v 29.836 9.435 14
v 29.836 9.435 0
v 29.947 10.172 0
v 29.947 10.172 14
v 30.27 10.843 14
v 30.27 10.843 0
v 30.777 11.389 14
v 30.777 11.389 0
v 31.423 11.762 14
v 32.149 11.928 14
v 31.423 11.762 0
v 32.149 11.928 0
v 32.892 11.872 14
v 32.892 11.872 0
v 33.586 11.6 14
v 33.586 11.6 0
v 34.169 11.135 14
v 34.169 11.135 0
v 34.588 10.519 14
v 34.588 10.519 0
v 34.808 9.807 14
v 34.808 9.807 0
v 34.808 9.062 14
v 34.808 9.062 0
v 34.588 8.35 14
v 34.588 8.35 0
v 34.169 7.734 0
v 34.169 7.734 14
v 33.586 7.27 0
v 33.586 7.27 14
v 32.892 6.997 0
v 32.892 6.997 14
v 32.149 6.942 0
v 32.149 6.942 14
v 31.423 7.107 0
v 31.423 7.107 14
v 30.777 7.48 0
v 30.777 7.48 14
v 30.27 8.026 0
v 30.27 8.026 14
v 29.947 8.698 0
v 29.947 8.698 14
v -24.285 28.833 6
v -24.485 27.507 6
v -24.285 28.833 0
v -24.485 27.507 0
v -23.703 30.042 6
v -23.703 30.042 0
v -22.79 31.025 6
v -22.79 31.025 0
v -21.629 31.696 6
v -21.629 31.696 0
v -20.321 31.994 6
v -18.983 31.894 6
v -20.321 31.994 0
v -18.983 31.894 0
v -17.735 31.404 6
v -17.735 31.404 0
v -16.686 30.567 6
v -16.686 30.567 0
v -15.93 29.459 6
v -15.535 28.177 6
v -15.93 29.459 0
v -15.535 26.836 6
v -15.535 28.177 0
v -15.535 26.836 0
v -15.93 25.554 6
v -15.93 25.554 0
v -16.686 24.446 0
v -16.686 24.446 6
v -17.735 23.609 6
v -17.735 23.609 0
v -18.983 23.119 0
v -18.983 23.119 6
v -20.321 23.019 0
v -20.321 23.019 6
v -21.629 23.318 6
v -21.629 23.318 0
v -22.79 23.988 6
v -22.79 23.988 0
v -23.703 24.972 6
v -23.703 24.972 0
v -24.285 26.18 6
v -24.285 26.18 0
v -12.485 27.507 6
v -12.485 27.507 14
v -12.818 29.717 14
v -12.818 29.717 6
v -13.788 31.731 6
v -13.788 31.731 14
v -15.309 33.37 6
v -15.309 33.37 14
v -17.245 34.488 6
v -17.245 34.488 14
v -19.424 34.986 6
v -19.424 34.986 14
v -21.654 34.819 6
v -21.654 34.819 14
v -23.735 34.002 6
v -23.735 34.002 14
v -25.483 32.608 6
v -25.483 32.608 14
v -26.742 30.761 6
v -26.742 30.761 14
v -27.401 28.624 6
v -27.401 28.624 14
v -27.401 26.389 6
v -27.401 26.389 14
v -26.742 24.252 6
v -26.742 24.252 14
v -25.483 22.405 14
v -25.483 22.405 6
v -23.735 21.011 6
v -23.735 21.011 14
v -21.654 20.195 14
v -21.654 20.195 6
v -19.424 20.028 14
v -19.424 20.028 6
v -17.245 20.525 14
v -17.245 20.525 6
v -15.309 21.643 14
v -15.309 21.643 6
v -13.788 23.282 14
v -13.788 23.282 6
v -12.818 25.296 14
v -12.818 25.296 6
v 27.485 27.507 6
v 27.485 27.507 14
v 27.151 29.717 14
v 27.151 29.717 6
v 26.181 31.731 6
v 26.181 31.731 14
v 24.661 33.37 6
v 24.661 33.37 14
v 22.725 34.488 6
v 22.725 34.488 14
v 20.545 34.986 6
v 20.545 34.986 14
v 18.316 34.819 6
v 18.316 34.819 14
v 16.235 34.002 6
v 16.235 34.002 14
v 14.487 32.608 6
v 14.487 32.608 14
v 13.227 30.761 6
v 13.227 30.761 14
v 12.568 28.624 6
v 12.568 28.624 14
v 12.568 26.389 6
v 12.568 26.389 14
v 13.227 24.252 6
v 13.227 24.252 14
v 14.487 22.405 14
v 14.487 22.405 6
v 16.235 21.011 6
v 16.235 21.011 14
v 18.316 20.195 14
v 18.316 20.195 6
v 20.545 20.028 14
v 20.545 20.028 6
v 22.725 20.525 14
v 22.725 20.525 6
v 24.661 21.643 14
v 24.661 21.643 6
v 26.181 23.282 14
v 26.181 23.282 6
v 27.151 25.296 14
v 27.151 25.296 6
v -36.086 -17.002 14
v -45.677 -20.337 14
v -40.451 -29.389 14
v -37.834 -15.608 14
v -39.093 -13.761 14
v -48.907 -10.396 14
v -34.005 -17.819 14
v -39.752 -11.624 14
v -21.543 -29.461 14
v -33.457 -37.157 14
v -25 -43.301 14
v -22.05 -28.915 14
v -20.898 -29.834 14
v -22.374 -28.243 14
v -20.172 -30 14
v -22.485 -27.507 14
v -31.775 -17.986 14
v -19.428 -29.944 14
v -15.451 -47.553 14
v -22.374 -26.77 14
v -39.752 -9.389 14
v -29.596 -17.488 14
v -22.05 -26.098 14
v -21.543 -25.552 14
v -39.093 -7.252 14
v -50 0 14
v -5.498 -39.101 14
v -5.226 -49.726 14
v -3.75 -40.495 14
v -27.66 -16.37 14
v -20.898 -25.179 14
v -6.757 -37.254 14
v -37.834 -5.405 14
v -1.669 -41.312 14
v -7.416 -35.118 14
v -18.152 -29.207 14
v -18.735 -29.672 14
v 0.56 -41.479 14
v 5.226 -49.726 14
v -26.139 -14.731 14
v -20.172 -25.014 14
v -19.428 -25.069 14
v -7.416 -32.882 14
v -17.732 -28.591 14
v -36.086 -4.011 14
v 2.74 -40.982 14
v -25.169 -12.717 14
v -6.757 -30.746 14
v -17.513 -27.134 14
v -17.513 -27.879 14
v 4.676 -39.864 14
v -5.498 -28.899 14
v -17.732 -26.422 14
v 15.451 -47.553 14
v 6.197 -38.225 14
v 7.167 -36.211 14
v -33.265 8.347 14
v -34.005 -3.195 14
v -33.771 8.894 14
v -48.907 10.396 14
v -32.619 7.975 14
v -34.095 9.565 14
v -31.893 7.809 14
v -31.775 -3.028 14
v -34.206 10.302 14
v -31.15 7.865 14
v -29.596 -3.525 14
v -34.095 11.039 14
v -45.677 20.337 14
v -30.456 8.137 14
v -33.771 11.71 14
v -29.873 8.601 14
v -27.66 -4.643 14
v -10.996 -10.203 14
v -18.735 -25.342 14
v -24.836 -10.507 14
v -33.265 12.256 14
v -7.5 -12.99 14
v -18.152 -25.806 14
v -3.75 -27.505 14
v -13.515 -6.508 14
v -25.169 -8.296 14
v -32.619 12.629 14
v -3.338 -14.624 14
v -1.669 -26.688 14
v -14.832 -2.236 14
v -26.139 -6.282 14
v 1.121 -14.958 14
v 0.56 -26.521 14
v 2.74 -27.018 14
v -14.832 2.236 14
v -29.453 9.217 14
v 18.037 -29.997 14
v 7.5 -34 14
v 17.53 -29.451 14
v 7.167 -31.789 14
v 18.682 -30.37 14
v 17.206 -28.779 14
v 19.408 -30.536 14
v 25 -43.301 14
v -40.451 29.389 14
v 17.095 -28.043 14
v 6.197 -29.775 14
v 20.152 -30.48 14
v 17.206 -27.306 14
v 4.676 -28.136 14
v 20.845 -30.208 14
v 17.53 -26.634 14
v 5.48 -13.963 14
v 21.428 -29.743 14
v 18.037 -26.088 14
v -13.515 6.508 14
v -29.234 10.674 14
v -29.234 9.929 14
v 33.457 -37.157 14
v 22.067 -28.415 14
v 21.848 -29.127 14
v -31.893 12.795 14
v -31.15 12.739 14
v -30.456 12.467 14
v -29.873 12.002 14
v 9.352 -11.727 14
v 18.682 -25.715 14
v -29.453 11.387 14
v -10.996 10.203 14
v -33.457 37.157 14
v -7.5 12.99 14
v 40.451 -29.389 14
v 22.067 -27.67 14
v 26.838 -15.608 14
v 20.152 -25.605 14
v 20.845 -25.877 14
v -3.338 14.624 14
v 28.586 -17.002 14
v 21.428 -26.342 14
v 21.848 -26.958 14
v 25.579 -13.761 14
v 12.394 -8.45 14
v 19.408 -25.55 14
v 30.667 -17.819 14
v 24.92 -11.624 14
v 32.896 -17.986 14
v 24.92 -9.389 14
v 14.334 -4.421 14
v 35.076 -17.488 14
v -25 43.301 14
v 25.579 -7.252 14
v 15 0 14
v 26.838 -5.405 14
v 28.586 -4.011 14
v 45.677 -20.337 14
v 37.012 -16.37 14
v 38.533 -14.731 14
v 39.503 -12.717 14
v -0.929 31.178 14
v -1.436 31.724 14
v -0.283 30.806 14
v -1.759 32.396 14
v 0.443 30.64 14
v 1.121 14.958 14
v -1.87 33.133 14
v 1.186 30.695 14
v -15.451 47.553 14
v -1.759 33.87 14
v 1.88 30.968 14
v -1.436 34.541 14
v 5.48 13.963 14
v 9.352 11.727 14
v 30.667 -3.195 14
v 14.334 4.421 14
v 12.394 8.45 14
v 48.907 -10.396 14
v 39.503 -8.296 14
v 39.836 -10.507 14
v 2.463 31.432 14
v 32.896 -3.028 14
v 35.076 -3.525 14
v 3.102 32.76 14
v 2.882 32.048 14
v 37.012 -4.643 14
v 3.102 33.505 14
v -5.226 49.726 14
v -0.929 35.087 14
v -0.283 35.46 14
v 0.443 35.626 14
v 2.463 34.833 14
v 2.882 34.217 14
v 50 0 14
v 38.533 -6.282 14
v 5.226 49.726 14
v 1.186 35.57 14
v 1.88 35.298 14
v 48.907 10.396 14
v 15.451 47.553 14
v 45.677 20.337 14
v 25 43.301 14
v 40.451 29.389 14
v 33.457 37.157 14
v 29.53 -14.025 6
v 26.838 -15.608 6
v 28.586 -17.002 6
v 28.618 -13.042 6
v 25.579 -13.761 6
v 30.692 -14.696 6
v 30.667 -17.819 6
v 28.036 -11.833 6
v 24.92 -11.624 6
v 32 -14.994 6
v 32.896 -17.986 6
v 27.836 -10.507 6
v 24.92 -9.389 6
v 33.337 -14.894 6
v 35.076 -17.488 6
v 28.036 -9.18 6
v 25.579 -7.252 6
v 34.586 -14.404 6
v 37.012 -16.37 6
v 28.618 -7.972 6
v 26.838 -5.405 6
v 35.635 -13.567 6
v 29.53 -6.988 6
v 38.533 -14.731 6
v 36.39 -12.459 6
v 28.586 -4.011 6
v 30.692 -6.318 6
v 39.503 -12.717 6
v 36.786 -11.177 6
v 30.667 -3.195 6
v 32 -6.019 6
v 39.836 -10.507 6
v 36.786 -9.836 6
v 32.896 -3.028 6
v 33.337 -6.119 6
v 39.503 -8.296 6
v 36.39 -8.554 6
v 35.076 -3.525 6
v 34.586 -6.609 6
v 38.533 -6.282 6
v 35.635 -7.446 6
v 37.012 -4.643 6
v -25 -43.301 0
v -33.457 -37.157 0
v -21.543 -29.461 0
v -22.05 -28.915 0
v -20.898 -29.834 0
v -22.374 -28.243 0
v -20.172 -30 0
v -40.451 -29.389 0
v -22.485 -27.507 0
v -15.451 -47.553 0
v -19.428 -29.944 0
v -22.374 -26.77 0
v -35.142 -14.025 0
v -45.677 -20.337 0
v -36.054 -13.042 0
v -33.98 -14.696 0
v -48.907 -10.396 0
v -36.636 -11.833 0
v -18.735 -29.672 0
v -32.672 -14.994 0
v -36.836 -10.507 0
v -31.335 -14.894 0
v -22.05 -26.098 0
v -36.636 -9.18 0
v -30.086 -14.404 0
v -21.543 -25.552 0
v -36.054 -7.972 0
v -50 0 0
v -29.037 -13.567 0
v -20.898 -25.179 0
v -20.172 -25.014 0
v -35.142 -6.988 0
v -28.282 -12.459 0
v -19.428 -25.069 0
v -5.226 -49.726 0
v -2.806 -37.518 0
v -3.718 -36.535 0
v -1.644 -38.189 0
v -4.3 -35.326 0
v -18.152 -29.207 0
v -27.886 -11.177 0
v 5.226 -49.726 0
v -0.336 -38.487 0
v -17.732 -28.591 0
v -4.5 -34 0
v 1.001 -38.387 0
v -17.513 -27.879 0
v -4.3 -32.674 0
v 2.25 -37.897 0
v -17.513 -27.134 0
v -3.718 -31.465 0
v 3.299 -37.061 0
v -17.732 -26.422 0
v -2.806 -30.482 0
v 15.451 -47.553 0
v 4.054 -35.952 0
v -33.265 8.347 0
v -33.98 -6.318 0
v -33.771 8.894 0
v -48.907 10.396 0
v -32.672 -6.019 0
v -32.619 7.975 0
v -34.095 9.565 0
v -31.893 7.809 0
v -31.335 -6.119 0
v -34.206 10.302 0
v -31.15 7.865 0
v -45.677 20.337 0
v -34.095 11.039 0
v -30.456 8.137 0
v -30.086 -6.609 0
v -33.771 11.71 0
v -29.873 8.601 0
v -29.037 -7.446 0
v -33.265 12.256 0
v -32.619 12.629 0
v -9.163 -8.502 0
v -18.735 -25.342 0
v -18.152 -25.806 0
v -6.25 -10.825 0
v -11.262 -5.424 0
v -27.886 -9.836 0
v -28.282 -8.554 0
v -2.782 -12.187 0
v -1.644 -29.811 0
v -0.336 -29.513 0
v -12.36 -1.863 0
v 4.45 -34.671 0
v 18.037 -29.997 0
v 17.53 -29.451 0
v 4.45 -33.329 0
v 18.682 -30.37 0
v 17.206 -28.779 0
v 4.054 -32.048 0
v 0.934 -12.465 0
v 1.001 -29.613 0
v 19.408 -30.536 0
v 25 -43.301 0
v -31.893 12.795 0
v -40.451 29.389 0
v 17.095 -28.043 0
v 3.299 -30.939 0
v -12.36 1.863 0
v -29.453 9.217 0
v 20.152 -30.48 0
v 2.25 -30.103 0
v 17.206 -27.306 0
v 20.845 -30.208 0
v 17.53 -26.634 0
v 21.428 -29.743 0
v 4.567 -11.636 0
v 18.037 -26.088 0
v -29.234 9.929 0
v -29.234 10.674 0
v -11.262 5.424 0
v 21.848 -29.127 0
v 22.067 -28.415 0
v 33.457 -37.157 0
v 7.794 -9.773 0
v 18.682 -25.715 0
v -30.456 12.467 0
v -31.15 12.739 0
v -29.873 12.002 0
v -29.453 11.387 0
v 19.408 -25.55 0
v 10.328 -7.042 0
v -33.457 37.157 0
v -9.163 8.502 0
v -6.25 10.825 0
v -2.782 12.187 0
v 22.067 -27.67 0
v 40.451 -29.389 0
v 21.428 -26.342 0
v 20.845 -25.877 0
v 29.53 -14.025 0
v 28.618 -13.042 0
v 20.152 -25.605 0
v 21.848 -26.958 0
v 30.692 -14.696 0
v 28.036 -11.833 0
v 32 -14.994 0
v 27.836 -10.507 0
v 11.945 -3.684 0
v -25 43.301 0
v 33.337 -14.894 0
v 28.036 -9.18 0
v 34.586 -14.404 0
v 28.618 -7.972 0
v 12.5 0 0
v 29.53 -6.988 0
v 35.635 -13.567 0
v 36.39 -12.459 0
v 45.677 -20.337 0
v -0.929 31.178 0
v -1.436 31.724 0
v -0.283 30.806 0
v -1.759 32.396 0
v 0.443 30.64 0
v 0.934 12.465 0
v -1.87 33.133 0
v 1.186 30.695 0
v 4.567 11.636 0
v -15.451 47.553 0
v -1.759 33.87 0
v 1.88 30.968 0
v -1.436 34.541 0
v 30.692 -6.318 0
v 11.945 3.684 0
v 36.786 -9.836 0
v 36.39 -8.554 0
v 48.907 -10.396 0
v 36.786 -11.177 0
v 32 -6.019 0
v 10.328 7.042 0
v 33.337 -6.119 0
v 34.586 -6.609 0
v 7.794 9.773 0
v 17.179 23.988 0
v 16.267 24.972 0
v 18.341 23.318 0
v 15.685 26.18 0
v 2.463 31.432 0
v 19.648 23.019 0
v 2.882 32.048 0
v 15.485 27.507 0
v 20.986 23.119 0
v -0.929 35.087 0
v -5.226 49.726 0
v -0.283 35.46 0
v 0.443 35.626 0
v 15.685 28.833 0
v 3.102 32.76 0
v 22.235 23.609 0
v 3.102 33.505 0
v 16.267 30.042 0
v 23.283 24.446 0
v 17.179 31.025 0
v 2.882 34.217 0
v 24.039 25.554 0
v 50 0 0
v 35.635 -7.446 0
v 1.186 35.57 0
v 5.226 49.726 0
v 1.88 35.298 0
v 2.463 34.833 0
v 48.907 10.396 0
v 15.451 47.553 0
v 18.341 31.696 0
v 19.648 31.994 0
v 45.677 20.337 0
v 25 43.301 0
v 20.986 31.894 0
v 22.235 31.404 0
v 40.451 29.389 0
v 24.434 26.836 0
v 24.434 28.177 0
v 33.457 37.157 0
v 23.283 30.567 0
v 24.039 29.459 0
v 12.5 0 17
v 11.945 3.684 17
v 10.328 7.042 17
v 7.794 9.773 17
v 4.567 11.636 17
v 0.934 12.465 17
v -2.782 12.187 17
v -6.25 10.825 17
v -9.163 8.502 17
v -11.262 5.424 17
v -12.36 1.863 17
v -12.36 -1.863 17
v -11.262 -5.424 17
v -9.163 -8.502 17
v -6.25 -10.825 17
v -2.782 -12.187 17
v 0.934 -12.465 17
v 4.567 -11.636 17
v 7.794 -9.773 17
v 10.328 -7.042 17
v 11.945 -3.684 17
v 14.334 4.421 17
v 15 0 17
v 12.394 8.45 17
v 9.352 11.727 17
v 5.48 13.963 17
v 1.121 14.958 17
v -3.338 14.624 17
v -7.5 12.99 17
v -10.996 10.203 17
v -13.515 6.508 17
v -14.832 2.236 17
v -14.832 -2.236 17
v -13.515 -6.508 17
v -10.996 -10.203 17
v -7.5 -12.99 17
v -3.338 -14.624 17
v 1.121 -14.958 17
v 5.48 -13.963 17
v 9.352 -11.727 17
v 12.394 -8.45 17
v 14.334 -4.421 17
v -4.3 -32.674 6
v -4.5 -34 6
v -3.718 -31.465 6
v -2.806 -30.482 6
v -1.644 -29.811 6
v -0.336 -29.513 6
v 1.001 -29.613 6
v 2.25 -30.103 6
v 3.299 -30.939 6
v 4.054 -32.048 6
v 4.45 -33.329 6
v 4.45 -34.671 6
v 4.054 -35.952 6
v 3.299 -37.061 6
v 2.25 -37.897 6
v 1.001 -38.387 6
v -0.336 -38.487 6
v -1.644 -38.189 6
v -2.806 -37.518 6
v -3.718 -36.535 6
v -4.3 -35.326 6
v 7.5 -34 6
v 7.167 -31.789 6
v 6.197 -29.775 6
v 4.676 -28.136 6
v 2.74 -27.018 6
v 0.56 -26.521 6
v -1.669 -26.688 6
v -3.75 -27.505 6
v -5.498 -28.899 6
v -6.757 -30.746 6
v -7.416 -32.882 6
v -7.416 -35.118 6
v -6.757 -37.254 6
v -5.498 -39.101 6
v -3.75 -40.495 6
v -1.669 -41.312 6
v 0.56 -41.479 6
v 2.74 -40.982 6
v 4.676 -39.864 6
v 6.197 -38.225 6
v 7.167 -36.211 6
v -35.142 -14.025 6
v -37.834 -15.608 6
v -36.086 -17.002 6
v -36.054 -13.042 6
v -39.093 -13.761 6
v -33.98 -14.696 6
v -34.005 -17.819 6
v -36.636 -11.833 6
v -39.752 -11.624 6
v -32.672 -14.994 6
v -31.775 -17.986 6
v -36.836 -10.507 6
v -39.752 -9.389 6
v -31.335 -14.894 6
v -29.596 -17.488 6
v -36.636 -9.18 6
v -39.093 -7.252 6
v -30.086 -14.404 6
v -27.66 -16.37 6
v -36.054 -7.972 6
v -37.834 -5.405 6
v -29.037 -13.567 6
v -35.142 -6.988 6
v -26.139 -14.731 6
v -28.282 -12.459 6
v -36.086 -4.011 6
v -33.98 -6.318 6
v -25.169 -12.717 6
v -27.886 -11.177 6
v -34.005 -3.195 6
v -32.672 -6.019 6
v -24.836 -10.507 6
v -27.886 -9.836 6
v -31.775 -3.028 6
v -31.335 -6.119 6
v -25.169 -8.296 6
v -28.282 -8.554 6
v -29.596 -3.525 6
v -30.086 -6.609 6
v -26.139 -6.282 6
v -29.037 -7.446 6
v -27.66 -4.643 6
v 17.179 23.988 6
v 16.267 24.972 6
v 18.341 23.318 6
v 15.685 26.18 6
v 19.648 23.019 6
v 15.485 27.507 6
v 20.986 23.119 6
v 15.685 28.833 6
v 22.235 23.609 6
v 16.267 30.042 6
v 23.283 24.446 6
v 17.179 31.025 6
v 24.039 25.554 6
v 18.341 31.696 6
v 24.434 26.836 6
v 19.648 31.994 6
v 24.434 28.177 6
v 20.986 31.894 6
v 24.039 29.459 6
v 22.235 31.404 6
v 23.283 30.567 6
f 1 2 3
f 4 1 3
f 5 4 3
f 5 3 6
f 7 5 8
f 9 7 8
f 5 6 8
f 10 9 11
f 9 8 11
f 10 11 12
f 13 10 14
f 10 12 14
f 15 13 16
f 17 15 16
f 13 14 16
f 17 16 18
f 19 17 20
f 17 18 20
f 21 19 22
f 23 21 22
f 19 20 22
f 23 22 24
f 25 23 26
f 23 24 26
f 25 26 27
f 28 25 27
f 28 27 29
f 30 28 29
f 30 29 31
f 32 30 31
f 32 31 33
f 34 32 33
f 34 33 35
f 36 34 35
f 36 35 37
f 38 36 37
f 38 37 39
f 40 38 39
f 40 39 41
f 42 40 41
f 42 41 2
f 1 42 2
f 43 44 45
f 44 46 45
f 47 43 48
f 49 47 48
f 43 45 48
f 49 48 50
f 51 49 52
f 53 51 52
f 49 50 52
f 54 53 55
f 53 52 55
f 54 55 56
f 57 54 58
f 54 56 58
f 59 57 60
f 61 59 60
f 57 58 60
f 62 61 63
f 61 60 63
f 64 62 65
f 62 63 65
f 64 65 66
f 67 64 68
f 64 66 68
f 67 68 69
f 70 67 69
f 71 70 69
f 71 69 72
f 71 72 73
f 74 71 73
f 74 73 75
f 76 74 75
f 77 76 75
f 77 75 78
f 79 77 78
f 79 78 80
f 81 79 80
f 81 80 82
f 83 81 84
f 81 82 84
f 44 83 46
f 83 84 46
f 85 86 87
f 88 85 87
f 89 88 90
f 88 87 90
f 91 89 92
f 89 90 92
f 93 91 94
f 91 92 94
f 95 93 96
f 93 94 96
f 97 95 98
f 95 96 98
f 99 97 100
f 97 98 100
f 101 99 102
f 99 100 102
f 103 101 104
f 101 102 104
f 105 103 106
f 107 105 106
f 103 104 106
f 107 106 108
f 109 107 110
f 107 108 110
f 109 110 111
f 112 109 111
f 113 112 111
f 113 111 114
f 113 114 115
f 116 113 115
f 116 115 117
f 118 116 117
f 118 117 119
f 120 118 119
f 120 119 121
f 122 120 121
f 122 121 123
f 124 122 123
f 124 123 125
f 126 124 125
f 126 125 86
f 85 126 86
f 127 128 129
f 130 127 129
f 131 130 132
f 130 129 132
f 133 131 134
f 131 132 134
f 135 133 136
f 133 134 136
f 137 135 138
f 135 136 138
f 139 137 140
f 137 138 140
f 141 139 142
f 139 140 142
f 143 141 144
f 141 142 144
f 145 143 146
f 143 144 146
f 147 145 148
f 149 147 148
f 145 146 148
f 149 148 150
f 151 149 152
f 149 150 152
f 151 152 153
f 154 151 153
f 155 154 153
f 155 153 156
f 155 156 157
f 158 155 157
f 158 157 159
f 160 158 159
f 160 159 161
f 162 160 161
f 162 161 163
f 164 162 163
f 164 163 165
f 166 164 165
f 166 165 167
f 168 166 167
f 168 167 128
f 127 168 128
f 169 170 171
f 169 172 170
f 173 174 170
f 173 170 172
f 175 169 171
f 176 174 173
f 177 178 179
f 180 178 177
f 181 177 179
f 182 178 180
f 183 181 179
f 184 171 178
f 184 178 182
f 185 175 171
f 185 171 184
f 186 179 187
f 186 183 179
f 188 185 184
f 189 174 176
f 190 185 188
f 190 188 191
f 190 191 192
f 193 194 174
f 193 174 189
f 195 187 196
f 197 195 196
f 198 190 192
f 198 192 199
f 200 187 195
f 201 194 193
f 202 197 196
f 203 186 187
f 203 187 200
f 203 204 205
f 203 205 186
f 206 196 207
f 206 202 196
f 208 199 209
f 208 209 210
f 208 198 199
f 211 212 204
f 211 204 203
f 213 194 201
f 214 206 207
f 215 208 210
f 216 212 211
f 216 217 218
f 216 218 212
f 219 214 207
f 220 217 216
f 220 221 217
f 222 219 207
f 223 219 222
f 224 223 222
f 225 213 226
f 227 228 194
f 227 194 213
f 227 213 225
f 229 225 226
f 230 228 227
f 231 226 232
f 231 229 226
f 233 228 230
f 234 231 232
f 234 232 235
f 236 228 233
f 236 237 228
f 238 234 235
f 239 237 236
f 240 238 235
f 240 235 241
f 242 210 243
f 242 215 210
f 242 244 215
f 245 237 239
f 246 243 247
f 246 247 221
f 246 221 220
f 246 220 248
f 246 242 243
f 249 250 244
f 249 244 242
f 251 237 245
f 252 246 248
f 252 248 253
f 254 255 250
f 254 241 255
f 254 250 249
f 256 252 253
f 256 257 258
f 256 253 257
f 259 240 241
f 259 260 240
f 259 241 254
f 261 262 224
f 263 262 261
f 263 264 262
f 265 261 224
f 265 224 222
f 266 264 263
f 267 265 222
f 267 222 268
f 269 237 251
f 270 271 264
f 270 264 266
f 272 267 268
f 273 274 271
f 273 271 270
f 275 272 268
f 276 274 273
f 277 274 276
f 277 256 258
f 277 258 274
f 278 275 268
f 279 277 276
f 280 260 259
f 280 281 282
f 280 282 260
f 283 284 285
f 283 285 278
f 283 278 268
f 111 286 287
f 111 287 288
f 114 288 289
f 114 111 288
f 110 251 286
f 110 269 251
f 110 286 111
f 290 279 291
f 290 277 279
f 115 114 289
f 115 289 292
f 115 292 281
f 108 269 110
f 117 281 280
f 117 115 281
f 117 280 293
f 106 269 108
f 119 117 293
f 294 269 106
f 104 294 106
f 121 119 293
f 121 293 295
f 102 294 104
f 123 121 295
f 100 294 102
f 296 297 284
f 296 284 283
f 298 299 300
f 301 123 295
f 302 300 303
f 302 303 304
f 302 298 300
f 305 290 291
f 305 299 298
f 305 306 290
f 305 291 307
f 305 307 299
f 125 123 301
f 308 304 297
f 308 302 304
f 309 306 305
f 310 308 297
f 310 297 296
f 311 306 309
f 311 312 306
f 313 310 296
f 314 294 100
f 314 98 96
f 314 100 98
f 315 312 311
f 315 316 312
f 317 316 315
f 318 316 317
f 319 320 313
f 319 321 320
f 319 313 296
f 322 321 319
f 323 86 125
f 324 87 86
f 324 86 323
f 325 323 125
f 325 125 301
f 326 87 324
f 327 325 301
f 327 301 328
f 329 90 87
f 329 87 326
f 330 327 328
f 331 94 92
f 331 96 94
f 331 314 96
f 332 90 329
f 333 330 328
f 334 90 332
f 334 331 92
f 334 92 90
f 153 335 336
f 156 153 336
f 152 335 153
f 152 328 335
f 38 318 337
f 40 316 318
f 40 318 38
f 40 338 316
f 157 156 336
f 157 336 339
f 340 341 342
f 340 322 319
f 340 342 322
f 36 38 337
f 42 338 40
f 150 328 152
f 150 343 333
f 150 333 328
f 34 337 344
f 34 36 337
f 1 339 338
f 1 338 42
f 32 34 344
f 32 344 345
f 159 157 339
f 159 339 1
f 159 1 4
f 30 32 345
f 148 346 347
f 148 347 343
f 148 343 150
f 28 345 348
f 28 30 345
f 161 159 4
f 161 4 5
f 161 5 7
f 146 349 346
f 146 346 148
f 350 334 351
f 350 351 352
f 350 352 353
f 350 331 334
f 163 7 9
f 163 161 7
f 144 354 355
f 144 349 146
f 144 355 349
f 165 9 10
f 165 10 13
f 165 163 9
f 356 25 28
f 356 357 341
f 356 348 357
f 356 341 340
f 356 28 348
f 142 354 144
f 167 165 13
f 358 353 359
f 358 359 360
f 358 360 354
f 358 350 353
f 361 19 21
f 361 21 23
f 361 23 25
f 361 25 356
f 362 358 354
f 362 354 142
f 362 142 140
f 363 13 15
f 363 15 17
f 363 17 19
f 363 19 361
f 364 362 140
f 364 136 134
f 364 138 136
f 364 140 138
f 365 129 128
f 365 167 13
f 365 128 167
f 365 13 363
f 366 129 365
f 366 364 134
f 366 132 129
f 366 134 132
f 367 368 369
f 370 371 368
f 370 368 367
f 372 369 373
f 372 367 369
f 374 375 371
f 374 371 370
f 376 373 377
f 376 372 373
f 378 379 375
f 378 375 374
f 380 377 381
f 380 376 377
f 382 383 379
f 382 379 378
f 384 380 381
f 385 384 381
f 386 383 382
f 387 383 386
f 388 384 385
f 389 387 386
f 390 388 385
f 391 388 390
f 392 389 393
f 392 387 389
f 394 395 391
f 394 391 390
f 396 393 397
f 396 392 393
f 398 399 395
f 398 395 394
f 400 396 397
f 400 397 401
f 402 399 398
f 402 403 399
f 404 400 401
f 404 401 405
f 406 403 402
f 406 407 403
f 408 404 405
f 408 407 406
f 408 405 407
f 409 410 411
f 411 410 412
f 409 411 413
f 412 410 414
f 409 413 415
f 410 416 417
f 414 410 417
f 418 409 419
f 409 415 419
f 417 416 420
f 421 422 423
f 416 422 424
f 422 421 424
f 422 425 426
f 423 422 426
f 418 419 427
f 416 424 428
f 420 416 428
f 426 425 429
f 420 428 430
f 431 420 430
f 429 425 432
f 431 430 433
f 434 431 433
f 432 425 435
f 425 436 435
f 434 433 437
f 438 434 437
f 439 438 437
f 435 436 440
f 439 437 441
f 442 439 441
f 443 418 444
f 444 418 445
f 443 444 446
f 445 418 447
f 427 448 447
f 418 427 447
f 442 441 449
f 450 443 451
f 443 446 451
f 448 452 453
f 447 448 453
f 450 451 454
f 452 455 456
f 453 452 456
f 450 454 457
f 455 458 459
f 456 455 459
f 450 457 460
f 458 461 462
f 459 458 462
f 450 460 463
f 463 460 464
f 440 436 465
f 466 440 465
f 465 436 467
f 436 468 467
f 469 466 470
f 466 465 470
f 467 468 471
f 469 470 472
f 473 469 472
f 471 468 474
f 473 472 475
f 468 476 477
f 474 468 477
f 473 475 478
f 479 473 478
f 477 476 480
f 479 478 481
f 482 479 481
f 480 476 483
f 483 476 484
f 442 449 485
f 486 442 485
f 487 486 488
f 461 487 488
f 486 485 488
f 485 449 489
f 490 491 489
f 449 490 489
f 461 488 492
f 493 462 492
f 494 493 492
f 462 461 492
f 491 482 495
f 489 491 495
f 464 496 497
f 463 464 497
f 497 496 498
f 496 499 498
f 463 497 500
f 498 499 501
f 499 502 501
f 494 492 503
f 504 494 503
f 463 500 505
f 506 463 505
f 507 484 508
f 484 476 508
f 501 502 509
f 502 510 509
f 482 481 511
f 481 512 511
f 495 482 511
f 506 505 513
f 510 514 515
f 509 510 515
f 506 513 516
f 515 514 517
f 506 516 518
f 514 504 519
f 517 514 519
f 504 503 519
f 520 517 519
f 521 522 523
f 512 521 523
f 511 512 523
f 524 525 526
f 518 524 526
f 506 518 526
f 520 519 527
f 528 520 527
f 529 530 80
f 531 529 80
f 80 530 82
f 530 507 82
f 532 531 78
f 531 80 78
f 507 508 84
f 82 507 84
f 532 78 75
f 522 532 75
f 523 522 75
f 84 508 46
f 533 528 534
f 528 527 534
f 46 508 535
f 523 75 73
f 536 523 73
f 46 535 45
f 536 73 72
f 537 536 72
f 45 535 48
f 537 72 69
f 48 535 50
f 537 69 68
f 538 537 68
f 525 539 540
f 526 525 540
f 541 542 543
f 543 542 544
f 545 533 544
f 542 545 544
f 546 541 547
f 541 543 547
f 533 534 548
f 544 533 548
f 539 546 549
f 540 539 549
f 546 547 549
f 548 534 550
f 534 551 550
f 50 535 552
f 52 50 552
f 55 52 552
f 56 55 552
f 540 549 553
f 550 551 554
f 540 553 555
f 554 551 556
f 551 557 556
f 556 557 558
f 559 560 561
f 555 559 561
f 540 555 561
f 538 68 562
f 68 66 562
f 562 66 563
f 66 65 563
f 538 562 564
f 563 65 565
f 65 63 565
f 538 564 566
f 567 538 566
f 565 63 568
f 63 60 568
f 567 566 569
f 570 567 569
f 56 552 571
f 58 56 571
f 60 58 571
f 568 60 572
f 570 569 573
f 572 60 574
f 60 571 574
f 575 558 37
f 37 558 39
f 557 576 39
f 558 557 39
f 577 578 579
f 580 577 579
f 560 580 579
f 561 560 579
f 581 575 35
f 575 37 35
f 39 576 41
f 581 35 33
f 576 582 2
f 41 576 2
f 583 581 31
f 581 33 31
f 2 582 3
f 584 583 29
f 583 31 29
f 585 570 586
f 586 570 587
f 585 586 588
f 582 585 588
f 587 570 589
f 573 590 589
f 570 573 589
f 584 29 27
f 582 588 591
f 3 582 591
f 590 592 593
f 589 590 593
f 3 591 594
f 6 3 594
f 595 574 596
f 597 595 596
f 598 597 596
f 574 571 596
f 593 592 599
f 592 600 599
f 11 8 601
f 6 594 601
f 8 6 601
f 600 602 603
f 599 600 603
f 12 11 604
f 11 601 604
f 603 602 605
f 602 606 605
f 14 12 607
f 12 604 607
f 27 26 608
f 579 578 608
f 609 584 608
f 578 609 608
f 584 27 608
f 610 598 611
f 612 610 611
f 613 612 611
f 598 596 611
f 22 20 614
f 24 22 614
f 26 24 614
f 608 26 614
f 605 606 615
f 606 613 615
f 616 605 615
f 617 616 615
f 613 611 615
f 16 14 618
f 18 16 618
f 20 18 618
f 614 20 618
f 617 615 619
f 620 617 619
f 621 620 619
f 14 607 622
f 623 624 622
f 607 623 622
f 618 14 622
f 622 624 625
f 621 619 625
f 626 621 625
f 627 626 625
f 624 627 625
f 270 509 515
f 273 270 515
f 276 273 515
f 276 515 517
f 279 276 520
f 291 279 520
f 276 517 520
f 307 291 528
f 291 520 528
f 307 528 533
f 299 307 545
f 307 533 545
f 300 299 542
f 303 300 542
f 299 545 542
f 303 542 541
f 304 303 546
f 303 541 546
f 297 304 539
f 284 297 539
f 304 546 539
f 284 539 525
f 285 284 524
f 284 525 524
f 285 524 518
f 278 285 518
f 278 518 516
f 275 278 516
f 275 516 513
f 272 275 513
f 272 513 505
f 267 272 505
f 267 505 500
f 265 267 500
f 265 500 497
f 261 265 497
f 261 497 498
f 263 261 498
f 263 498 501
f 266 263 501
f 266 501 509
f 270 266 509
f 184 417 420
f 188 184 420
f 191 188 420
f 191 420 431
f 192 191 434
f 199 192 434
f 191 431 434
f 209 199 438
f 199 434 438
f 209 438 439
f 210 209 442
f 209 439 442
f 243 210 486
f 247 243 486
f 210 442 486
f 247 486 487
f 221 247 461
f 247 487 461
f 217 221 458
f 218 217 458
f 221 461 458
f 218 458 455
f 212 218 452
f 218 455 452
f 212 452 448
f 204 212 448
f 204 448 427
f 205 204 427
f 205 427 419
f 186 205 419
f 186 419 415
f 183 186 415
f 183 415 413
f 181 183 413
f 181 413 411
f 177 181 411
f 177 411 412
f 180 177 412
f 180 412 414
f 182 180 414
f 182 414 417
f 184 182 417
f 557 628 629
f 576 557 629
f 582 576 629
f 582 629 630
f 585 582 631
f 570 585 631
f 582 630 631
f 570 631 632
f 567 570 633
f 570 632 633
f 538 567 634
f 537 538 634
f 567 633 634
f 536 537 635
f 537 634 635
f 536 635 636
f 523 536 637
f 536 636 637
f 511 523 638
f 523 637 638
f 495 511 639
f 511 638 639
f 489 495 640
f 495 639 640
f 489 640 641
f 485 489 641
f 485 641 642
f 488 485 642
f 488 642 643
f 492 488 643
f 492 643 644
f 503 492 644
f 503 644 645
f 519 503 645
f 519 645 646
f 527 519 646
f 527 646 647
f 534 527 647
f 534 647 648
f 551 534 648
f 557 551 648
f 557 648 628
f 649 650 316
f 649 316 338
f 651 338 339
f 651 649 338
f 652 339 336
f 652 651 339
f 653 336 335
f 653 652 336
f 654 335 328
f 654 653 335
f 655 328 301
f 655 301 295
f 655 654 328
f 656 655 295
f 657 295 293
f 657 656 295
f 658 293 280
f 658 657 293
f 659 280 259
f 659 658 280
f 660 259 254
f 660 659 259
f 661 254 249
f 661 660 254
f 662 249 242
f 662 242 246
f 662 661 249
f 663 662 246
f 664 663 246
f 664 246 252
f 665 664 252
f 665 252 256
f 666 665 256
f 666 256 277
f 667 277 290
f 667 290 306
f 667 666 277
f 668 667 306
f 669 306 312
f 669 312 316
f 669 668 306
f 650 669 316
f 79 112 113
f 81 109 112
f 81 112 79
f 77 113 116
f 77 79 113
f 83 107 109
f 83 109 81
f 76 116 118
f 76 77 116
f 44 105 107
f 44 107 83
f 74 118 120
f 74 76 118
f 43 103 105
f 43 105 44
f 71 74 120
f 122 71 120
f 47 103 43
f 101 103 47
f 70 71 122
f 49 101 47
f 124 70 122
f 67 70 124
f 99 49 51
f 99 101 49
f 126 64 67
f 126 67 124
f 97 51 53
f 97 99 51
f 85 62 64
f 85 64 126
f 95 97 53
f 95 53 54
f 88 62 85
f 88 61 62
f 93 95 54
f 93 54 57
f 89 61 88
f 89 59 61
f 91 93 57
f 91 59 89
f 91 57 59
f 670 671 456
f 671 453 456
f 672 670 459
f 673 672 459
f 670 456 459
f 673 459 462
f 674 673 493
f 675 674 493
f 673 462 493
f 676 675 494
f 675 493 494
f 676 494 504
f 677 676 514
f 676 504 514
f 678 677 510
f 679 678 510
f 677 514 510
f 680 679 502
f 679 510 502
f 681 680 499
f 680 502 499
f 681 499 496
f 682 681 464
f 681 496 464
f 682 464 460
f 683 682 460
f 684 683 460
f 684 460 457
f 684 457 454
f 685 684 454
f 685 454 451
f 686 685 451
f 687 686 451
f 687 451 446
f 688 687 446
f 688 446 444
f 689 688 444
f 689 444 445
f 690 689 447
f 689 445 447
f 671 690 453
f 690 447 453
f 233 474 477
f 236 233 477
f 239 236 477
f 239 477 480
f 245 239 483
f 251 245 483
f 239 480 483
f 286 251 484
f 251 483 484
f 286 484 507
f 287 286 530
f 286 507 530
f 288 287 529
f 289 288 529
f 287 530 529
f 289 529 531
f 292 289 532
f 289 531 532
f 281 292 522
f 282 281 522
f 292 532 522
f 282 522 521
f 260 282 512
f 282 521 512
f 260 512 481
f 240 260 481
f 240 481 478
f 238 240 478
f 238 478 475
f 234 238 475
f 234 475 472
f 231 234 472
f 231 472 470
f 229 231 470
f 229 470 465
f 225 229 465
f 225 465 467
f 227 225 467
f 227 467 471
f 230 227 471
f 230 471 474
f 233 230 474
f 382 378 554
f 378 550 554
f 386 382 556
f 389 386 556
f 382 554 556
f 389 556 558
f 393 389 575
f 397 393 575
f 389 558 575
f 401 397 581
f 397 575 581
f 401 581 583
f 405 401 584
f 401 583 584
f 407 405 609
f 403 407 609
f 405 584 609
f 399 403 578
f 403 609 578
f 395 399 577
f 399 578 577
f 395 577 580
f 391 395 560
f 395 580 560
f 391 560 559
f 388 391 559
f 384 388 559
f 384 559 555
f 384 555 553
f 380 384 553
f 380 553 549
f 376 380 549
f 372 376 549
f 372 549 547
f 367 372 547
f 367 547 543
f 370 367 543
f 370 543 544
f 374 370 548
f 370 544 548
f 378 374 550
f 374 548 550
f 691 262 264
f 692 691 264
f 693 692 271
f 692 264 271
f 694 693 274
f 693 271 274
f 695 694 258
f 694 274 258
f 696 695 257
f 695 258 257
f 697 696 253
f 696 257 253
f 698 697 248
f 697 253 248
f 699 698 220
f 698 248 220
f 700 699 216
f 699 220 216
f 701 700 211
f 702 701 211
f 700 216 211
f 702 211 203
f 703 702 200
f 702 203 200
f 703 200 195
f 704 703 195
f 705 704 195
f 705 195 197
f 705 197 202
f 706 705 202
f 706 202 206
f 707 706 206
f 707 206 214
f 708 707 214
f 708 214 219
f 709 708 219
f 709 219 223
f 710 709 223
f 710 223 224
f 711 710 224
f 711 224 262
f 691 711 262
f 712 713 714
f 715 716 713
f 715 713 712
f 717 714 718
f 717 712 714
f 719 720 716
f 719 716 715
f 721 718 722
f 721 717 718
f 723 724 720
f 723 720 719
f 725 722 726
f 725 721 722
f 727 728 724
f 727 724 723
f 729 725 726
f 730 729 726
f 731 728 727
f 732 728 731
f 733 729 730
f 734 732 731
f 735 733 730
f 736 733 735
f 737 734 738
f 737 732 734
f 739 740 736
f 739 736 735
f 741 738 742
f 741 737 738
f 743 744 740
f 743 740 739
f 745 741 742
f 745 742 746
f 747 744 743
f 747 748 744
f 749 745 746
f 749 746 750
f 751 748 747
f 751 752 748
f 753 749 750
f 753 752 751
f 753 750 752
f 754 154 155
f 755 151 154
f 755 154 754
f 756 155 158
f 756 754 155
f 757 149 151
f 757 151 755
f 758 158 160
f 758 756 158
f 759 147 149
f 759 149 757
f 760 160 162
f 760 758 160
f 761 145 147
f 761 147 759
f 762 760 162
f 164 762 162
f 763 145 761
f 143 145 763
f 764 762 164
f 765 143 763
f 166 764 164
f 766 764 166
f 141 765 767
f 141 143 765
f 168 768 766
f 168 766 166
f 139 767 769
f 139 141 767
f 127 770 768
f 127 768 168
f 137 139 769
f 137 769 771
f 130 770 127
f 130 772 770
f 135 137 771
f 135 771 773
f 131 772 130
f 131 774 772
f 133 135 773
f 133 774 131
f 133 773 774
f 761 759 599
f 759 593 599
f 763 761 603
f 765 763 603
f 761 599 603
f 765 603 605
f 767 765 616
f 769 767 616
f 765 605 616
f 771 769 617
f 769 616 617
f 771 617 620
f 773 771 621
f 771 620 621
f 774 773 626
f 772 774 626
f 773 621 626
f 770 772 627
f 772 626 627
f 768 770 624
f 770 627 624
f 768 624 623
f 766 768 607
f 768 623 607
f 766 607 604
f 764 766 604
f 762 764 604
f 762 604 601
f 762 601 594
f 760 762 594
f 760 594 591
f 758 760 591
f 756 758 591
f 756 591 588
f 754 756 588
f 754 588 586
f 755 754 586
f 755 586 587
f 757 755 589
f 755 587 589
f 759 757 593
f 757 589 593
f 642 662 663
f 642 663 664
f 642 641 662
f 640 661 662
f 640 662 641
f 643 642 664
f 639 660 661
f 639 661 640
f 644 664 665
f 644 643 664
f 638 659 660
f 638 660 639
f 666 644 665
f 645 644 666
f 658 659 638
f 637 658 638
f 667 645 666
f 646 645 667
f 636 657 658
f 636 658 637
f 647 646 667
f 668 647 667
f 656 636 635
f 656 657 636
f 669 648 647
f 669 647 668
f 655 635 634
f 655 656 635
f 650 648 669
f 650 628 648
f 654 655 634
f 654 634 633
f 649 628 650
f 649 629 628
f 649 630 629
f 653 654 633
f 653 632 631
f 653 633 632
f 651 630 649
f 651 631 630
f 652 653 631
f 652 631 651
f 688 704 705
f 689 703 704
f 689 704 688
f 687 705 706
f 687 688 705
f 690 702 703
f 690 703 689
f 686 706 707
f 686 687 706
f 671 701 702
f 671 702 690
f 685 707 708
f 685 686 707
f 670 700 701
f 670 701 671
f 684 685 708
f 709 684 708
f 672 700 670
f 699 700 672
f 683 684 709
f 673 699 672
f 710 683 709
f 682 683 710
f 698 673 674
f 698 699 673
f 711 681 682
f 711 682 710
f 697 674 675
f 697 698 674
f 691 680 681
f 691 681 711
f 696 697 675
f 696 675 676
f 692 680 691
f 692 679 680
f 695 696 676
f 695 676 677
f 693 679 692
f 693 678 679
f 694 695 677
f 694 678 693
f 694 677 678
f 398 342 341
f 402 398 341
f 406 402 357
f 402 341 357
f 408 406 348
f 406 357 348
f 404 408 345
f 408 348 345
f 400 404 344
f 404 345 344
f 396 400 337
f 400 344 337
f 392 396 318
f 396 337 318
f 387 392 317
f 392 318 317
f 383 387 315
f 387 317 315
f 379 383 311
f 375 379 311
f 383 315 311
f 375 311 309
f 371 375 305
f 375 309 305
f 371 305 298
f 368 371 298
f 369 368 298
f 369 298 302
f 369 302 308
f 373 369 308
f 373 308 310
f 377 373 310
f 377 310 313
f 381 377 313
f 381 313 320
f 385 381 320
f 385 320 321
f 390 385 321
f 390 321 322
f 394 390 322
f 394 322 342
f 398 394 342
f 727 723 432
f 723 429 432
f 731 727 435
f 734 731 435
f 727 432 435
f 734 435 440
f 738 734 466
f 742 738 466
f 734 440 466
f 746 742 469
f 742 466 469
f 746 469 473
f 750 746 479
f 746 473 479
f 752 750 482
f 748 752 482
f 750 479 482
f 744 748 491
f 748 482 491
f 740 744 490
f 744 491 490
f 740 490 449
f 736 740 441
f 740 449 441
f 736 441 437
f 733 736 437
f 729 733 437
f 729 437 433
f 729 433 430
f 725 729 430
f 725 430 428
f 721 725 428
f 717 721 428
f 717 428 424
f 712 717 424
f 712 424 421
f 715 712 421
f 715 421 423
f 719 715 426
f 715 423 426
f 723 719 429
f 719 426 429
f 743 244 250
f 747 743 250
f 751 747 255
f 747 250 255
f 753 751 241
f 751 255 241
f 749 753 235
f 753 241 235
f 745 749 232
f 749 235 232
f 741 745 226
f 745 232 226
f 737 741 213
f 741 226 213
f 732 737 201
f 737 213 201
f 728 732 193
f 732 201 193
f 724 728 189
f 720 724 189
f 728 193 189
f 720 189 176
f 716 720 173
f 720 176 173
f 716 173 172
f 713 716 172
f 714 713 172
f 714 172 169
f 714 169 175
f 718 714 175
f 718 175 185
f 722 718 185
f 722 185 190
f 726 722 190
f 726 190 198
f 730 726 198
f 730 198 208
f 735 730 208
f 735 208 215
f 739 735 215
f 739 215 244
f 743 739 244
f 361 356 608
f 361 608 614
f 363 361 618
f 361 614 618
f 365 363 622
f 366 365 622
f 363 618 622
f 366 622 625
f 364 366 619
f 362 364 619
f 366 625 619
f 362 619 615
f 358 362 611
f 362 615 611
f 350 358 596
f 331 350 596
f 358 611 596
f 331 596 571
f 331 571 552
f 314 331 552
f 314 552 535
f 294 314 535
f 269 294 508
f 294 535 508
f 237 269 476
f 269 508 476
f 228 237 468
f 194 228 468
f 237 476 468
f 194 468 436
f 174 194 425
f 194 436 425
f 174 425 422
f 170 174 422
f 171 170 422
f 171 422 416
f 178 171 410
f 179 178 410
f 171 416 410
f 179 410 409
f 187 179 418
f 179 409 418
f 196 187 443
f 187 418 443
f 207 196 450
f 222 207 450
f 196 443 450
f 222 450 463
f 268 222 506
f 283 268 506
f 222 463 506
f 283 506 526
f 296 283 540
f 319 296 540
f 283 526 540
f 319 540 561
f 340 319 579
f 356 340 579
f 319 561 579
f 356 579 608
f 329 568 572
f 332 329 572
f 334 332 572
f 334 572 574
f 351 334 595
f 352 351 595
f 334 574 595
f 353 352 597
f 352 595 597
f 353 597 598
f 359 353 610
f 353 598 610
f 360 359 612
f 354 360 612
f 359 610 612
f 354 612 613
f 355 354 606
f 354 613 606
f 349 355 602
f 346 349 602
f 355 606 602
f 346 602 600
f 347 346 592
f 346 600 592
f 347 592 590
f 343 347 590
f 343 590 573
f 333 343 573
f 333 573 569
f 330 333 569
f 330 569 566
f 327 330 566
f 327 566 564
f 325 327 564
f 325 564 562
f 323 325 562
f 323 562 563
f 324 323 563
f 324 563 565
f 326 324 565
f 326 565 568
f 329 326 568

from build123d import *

# Parameters (mm, degrees)
SKETCH1_R                      = 50
BOSS_EXTRUDE1_DEPTH            = 14
SKETCH2_R                      = 12.5
CUT_EXTRUDE1_DEPTH             = 73.083285164
BOSS_EXTRUDE2_START            = 3
SKETCH3_R                      = 15
SKETCH3_R_2                    = 12.5
BOSS_EXTRUDE2_DEPTH            = 3
CBORE_FOR_M8_SHCS1_D           = 9
CBORE_FOR_M8_SHCS1_CBORE_D     = 15
CBORE_FOR_M8_SHCS1_CBORE_DEPTH = 8
M6X1_0_TAPPED_HOLE1_D          = 5


with BuildPart() as part:
    # Sketch1 → Boss-Extrude1 (new body)
    with BuildSketch(Plane.XY):
        Circle(SKETCH1_R)
    extrude(amount=BOSS_EXTRUDE1_DEPTH)

    # Sketch2 → Cut-Extrude1 (cut, through all)
    with BuildSketch(Plane.XY.offset(14)):
        Circle(SKETCH2_R)
    extrude(amount=-CUT_EXTRUDE1_DEPTH, mode=Mode.SUBTRACT)

    # Sketch3 → Boss-Extrude2 (add)
    with BuildSketch(Plane.XY.offset(14).offset(BOSS_EXTRUDE2_START)):
        Circle(SKETCH3_R)
        Circle(SKETCH3_R_2, mode=Mode.SUBTRACT)
    extrude(amount=-BOSS_EXTRUDE2_DEPTH)

    # CBORE for M8 SHCS1 (through all)
    with Locations(Plane.XY.offset(14)):
        with Locations((0, -34), (-32.335921554, -10.506577809), (-19.984698578, 27.506577809), (19.984698578, 27.506577809), (32.335921554, -10.506577809)):
            CounterBoreHole(CBORE_FOR_M8_SHCS1_D / 2, CBORE_FOR_M8_SHCS1_CBORE_D / 2, CBORE_FOR_M8_SHCS1_CBORE_DEPTH)

    # M6x1.0 Tapped Hole1 (through all)
    with Locations(Plane.XY.offset(14)):
        with Locations((-19.984698578, -27.506577809), (-31.705846612, 10.30185405), (0.630074942, 33.132776241), (32.335921554, 9.434630291), (19.595290848, -28.042551568), (0.174148431, -0.535973759)):
            Hole(M6X1_0_TAPPED_HOLE1_D / 2)


solid = part.part
